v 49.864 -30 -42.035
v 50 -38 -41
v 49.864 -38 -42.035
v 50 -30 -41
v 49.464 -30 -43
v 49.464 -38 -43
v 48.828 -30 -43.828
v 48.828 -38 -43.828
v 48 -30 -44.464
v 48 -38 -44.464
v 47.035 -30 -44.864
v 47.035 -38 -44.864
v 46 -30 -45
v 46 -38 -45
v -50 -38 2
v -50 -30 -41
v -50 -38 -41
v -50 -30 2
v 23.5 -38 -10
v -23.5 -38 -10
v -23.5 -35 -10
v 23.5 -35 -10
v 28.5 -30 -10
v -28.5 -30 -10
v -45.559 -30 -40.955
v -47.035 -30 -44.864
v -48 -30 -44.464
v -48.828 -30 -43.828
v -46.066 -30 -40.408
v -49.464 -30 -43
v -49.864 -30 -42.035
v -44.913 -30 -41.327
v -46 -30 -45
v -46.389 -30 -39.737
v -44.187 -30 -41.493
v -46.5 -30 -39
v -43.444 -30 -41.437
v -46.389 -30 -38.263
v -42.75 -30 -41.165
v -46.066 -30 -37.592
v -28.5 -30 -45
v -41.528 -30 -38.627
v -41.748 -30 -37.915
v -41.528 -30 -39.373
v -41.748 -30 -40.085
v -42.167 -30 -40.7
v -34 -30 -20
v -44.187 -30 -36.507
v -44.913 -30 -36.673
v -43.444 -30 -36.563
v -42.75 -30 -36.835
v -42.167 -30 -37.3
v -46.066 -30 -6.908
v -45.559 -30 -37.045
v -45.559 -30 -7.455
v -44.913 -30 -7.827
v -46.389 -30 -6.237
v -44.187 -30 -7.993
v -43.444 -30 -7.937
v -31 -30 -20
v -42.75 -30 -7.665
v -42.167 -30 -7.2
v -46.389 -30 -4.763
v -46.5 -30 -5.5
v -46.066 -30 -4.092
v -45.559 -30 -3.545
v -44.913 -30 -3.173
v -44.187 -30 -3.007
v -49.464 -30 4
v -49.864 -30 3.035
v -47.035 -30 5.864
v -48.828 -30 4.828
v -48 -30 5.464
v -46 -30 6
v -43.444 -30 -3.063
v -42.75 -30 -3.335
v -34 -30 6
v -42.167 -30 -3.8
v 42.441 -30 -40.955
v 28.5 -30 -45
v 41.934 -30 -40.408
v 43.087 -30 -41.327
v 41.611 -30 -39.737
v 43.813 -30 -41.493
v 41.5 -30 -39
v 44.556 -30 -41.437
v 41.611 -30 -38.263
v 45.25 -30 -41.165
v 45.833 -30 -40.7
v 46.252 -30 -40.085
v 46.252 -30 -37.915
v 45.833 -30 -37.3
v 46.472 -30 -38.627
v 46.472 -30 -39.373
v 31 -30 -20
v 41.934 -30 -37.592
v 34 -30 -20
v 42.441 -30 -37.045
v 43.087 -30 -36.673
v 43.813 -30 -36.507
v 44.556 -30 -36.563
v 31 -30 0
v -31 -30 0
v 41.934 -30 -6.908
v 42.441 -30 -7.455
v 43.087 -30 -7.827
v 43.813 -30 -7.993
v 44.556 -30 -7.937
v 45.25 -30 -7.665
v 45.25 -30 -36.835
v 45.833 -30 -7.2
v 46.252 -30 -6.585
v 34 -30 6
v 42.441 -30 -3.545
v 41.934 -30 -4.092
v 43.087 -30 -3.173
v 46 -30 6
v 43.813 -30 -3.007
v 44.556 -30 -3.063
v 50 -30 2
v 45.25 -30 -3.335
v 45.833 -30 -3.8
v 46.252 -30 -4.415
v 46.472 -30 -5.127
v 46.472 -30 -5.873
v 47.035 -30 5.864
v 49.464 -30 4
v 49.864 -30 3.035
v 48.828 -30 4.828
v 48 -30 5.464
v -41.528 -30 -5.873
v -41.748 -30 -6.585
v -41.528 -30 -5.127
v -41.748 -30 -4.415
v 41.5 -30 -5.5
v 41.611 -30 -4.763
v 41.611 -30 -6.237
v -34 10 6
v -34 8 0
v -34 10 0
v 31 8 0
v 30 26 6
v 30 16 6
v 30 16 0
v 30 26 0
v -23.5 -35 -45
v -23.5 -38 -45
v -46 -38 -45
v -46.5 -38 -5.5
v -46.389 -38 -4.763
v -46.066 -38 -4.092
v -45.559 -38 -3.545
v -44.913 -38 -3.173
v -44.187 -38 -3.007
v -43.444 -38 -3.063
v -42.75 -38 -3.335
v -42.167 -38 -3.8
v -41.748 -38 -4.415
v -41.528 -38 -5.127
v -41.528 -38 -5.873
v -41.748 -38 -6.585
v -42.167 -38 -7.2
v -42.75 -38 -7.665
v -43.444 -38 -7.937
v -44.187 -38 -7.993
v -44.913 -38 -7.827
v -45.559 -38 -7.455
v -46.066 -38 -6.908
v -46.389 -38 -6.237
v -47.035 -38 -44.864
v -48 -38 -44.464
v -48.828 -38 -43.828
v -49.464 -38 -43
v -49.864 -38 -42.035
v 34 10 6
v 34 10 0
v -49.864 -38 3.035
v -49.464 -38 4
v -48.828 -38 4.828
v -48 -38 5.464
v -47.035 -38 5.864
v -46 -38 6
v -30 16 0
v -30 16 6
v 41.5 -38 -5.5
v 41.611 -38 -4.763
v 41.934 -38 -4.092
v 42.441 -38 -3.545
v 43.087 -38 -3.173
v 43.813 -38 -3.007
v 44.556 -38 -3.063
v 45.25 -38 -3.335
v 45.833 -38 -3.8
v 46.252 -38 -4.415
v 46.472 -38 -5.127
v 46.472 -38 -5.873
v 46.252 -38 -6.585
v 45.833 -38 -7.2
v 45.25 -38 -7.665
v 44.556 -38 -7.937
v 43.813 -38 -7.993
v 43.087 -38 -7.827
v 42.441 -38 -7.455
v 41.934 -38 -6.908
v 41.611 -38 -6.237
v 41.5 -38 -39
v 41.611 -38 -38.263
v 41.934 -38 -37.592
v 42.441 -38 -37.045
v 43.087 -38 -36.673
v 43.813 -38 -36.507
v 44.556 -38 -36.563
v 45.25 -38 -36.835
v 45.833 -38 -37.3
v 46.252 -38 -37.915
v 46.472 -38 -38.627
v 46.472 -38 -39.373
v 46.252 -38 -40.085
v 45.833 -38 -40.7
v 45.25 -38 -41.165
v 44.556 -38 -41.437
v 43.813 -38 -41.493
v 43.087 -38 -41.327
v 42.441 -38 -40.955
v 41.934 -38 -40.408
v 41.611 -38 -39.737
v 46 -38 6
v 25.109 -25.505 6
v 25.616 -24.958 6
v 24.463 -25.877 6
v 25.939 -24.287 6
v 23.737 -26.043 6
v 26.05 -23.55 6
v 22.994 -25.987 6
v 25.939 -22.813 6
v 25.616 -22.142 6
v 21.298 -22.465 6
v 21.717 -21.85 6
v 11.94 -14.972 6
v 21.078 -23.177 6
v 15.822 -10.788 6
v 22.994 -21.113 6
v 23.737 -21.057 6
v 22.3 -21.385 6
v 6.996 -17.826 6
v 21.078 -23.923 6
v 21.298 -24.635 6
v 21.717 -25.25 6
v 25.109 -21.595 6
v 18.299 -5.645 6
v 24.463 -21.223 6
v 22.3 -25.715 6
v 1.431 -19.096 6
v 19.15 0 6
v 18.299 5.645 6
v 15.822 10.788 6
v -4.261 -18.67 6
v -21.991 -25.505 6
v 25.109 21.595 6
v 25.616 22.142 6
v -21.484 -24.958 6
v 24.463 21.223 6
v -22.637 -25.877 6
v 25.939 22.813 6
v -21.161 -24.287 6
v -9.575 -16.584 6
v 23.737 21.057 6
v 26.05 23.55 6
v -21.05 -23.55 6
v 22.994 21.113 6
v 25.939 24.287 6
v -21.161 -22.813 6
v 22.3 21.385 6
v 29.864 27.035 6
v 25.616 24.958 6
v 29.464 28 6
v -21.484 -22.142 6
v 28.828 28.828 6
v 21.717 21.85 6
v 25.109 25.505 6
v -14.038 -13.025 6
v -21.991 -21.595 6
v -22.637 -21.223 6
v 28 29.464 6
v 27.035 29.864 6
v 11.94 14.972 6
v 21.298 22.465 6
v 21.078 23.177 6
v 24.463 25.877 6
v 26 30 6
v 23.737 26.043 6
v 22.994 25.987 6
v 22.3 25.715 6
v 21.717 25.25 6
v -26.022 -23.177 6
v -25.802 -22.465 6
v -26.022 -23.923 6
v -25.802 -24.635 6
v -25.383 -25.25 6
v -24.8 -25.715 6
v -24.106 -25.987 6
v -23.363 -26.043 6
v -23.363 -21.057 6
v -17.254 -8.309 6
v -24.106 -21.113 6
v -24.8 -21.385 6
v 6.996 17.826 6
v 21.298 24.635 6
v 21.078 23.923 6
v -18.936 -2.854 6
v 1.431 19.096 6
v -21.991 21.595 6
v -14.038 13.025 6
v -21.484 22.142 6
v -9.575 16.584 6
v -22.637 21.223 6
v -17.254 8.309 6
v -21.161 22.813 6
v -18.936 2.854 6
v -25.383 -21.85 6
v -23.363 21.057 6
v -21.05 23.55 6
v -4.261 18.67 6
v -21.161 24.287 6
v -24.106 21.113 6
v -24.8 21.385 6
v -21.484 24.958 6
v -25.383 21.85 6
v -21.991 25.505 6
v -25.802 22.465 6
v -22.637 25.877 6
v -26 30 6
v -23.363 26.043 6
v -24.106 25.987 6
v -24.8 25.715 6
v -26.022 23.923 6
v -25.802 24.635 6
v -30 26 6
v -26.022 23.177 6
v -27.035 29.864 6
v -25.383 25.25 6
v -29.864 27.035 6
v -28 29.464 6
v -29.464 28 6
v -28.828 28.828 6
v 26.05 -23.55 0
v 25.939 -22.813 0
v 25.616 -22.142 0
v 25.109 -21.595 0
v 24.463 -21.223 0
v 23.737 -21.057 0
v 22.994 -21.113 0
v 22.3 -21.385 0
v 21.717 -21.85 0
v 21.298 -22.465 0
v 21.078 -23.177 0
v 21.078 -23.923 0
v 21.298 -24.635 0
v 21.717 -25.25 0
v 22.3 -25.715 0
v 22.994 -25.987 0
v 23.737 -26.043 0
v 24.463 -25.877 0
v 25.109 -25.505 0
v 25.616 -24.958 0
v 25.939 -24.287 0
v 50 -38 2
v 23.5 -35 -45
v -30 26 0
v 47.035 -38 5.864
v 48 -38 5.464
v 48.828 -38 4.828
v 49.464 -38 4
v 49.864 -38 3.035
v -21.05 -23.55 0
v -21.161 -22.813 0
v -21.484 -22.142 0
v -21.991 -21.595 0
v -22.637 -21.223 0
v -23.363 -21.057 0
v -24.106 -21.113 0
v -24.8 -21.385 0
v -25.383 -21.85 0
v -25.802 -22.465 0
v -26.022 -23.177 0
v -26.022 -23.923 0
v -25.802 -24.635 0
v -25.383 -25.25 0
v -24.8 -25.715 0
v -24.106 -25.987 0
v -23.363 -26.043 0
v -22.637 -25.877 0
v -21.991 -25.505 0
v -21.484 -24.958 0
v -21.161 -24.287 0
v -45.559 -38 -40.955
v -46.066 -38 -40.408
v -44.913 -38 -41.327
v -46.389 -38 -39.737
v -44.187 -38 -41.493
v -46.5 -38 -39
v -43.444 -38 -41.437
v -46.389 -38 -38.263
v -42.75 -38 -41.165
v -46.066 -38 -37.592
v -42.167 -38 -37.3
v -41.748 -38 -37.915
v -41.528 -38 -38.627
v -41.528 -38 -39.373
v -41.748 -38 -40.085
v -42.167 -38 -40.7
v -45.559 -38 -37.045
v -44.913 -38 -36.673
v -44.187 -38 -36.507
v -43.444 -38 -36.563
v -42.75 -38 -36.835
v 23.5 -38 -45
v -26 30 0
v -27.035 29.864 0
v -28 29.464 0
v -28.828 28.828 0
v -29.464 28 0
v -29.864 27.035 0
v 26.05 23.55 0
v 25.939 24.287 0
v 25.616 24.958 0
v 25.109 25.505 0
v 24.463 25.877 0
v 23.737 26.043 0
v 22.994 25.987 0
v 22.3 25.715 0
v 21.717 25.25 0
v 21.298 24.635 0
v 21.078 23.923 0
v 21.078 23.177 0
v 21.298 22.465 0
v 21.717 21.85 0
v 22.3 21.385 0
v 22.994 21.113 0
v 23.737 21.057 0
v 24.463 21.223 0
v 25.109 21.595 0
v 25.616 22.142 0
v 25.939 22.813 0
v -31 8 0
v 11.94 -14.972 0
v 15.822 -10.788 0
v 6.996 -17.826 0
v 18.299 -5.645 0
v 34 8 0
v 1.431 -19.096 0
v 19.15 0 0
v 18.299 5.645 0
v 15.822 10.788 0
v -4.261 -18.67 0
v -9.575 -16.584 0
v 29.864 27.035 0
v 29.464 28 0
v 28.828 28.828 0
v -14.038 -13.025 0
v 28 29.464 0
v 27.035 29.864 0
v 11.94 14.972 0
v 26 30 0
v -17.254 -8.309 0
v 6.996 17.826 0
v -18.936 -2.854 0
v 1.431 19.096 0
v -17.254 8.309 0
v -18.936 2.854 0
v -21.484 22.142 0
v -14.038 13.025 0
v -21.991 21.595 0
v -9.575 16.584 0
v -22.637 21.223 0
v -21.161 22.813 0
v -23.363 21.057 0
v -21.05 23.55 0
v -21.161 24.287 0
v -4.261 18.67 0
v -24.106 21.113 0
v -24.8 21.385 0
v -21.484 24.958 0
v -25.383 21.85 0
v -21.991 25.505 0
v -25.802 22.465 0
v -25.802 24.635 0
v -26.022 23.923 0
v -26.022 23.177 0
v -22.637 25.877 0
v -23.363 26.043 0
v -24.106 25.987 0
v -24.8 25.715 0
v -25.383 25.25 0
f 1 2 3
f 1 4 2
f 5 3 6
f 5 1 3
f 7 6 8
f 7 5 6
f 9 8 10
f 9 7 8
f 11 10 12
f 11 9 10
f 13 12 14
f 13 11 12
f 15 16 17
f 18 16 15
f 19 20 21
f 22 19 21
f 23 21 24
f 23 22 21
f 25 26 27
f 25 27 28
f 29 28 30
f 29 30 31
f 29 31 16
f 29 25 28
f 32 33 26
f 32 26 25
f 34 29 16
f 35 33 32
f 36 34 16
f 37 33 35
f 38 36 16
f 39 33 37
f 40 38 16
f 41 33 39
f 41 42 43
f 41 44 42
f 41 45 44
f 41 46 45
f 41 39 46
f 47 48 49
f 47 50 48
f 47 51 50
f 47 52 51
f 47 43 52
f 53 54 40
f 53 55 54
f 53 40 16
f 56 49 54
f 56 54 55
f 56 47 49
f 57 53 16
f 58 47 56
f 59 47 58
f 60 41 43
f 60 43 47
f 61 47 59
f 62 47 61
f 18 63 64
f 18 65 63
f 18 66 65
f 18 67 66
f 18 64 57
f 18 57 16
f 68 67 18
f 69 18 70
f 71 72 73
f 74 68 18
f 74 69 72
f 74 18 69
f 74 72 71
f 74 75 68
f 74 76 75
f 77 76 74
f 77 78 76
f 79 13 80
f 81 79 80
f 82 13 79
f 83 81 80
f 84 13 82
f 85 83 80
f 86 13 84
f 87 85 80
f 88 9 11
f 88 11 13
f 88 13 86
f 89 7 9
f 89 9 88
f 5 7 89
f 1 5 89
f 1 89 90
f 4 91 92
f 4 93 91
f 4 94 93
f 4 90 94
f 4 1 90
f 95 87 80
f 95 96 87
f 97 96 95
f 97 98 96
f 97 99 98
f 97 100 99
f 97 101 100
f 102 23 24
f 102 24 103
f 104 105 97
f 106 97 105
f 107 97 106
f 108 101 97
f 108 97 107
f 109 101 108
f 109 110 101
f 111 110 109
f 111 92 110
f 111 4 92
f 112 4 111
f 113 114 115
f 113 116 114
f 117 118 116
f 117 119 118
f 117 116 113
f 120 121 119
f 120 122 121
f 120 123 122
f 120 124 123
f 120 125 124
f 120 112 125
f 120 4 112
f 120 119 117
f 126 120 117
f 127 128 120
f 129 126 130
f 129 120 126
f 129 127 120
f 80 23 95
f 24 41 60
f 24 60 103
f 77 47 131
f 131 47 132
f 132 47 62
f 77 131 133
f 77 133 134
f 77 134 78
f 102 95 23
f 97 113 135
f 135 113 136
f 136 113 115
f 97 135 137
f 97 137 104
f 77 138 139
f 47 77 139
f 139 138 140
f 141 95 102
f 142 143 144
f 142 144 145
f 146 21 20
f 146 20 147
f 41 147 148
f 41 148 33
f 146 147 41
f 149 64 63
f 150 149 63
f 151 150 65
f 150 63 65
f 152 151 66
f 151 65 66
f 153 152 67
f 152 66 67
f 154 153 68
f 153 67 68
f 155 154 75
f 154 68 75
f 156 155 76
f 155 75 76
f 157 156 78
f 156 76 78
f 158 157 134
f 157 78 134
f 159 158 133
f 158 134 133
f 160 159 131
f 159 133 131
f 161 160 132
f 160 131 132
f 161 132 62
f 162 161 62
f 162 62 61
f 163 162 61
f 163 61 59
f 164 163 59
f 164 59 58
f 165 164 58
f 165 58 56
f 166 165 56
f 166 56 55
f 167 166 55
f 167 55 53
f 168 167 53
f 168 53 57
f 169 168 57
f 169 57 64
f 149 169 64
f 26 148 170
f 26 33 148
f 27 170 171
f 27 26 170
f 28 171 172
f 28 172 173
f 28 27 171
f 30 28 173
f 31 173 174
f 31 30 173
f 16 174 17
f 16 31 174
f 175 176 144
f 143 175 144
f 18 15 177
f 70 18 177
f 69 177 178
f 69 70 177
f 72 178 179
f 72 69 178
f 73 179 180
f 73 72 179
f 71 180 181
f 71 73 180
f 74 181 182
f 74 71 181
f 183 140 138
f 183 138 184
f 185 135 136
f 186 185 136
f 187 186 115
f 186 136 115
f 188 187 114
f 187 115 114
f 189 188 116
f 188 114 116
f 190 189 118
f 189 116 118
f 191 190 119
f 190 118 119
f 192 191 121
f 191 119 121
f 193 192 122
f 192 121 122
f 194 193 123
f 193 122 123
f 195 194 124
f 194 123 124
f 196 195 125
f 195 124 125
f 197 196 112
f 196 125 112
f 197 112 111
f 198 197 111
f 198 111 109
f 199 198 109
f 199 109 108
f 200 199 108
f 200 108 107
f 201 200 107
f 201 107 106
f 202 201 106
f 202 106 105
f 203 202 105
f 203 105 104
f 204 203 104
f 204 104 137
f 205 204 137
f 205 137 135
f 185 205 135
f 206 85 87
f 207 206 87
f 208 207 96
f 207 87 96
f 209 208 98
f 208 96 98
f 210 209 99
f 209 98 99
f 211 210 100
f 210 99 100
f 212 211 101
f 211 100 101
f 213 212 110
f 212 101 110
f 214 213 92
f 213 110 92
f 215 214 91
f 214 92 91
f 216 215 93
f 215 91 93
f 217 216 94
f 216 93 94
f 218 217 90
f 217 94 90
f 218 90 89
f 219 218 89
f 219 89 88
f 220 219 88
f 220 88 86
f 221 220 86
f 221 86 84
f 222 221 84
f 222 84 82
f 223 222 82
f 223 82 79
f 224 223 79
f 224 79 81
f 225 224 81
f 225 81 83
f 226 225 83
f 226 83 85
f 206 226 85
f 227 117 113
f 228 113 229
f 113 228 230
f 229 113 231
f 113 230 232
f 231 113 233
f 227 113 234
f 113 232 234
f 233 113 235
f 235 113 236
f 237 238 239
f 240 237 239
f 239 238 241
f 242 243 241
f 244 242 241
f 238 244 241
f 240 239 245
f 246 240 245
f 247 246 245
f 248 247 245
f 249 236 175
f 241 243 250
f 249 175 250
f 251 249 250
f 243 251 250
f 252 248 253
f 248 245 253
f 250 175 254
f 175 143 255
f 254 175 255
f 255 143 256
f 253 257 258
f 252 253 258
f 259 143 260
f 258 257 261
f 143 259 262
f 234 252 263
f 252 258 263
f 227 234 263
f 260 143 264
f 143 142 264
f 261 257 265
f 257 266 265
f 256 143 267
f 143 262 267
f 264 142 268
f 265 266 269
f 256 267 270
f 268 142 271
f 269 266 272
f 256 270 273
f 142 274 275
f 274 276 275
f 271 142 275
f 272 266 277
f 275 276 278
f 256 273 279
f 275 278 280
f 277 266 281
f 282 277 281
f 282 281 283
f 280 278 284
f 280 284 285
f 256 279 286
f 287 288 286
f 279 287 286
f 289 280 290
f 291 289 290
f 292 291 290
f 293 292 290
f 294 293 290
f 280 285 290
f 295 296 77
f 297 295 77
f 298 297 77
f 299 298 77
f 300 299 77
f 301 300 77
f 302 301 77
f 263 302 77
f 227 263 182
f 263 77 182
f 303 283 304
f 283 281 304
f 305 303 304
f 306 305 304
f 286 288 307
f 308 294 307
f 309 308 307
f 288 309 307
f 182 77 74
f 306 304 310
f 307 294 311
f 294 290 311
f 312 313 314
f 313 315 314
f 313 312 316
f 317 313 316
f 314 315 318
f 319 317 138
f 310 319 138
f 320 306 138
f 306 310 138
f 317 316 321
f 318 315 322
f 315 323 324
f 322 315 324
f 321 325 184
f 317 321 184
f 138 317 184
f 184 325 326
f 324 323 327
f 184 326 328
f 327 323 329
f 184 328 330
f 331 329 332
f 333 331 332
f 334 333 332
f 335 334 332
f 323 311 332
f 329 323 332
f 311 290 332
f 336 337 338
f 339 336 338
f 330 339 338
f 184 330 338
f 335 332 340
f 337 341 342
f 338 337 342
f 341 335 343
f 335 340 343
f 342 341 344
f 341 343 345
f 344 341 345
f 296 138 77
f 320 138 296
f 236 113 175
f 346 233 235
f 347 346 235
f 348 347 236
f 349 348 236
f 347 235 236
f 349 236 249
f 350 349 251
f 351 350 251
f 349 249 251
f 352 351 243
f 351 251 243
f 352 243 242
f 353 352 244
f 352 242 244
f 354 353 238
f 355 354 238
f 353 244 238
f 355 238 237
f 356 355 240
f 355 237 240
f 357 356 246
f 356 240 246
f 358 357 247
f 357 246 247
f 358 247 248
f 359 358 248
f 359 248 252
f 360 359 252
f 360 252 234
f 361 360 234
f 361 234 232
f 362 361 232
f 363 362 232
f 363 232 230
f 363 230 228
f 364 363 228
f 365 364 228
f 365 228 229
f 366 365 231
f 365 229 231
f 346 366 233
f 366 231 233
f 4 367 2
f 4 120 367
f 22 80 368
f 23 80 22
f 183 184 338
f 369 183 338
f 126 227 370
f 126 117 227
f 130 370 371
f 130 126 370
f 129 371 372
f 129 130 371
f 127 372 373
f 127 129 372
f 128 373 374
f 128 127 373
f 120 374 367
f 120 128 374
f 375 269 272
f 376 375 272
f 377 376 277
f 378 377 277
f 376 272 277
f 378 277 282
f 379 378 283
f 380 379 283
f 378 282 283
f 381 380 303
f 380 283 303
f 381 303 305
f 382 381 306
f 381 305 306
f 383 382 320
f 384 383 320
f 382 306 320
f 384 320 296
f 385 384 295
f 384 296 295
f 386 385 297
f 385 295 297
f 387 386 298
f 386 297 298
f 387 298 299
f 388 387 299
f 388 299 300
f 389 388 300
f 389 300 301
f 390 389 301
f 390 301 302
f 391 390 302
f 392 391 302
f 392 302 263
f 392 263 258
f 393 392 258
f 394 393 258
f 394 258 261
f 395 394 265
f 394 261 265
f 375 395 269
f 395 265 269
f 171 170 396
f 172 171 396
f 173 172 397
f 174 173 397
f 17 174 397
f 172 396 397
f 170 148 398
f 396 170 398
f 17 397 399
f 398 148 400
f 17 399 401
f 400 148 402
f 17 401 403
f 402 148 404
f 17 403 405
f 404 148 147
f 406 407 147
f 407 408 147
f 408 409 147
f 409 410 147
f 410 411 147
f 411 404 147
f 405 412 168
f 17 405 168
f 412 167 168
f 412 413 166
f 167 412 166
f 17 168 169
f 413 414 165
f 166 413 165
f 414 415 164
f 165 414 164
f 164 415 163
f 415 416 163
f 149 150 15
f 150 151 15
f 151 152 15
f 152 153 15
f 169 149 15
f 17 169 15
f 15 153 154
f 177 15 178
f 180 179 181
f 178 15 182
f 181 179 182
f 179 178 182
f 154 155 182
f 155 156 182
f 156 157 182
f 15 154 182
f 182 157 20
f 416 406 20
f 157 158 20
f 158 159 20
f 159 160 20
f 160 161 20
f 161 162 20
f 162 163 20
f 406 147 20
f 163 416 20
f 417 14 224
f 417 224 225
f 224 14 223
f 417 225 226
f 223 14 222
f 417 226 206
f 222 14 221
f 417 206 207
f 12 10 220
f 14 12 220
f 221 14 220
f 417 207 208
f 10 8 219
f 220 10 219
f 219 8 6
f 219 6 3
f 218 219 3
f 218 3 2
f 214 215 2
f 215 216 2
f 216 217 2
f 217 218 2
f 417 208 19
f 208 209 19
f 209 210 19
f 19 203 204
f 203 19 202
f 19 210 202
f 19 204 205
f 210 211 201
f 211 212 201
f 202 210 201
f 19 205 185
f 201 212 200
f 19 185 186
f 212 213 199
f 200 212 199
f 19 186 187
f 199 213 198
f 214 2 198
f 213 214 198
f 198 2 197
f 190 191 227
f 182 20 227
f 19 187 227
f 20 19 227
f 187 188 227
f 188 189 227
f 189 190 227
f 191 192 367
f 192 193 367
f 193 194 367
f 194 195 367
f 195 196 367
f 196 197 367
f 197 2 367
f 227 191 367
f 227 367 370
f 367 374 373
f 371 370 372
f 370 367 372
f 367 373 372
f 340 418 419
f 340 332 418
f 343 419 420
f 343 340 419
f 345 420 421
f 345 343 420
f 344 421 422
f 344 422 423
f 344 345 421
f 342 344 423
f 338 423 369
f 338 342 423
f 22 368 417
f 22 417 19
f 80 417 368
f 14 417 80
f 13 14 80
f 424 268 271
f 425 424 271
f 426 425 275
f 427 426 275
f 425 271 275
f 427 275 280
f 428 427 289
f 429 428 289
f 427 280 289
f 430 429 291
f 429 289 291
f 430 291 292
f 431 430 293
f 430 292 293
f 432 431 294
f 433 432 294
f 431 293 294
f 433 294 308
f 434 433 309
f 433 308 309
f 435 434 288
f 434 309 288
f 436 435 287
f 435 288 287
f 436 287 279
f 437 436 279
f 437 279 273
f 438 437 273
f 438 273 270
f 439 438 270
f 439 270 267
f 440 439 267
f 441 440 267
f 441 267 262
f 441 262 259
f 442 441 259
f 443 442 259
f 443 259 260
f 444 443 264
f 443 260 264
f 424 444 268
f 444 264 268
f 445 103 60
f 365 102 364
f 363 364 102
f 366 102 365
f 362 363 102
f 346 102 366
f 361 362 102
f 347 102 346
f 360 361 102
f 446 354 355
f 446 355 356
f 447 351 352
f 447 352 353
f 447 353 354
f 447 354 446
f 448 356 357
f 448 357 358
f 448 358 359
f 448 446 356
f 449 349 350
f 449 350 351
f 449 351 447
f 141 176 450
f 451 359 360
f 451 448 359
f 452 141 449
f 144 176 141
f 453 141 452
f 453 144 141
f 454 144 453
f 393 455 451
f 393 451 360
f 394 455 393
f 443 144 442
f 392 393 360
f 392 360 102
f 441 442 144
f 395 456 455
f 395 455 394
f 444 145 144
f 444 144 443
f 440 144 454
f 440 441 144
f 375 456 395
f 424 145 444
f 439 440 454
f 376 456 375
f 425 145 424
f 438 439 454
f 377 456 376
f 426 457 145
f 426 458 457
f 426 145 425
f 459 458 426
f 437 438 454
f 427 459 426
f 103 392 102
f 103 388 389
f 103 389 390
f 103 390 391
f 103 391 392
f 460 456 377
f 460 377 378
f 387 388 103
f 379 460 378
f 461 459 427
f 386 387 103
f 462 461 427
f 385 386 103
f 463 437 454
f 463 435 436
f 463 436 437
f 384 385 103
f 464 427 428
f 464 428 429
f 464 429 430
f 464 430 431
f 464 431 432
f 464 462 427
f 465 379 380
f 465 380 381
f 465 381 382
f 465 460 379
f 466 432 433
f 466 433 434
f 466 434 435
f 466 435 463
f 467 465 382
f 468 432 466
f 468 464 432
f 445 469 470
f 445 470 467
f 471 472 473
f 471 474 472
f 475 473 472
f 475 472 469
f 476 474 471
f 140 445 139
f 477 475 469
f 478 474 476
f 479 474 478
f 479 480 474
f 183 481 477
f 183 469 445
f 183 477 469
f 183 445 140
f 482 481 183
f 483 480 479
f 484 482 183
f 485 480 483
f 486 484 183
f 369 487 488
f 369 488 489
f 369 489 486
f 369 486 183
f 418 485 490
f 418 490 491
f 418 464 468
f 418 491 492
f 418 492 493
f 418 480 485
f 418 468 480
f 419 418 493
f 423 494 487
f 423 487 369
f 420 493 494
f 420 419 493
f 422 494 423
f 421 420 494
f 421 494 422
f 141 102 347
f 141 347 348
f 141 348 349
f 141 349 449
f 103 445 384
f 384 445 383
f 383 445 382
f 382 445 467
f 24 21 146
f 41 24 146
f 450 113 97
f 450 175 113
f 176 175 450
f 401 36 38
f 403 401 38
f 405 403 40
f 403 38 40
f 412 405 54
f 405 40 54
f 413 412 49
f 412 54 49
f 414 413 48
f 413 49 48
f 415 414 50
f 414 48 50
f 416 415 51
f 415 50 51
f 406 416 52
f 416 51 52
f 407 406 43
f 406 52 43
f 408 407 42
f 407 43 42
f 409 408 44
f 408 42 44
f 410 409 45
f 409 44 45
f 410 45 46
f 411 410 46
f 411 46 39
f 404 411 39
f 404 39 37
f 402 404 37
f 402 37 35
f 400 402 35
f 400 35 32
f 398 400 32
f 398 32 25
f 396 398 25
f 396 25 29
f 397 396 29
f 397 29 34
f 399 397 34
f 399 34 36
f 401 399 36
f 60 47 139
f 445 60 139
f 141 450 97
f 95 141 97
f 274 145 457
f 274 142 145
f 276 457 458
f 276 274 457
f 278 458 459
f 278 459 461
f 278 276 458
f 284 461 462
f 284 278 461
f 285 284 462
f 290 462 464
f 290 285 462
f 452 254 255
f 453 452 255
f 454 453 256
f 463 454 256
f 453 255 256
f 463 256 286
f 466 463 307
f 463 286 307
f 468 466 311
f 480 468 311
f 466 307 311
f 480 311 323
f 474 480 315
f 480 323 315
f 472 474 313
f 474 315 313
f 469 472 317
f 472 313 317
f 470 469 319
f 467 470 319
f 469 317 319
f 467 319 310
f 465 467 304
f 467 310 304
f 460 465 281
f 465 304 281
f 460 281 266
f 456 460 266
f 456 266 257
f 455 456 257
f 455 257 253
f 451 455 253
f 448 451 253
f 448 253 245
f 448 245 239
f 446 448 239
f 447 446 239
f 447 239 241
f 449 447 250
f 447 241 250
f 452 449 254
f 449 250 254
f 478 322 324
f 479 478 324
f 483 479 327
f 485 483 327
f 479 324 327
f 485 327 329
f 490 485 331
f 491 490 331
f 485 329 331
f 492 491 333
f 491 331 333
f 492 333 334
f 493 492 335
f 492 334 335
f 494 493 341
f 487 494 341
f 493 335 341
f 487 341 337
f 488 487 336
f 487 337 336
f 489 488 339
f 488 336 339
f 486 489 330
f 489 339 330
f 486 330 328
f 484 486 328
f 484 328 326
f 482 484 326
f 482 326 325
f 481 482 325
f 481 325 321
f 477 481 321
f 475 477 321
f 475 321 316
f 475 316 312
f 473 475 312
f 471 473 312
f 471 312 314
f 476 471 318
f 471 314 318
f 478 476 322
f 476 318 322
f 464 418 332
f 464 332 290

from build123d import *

# Parameters (mm, degrees)
SKETCH_1_W          = 60
SKETCH_1_H          = 60
EXTRUDE_1_DEPTH     = 6
SKETCH_2_R          = 19.15
CUT_EXTRUDE_1_DEPTH = 6
SKETCH_3_R          = 2.5
CUT_EXTRUDE_2_DEPTH = 6
SKETCH_4_W          = 60
SKETCH_4_H          = 6
EXTRUDE_2_DEPTH     = 8
SKETCH_5_W          = 60
SKETCH_5_H          = 8
EXTRUDE_3_DEPTH     = 45
SKETCH_6_W          = 51
SKETCH_6_H          = 8
EXTRUDE_4_DEPTH     = 20
SKETCH_7_W          = 51
SKETCH_7_H          = 8
EXTRUDE_5_DEPTH     = 20
EXTRUDE_6_DEPTH     = 6
EXTRUDE_8_DEPTH     = 6
EXTRUDE_10_DEPTH    = 2
EXTRUDE_11_DEPTH    = 2
EXTRUDE_12_DEPTH    = 1
EXTRUDE_13_DEPTH    = 1
SKETCH_14_W         = 35
SKETCH_14_H         = 59.55119734
CUT_EXTRUDE_3_DEPTH = 10
SKETCH_15_R         = 2.5
CUT_EXTRUDE_4_DEPTH = 10
SKETCH_16_W         = 35
SKETCH_16_H         = 8
CUT_EXTRUDE_6_DEPTH = 6
SKETCH_17_W         = 35
SKETCH_17_H         = 8
CUT_EXTRUDE_7_DEPTH = 6
CHAMFER_3_SIZE      = 5
CHAMFER_4_SIZE      = 5
FILLET_2_R          = 4
FILLET_3_R          = 4
FILLET_4_R          = 4
FILLET_5_R          = 4
FILLET_6_R          = 4
FILLET_7_R          = 4


with BuildPart() as part:
    # 草图1 → 凸台-拉伸1 (new body)
    with BuildSketch(Plane.XY):
        Rectangle(SKETCH_1_W, SKETCH_1_H)
    extrude(amount=EXTRUDE_1_DEPTH)

    # 草图2 → 切除-拉伸1 (cut)
    with BuildSketch(Plane.XY.offset(6)):
        Circle(SKETCH_2_R)
    extrude(amount=-CUT_EXTRUDE_1_DEPTH, mode=Mode.SUBTRACT)

    # 草图3 → 切除-拉伸2 (cut)
    with BuildSketch(Plane.XY.offset(6)):
        with Locations((-23.55, 23.55)):
            Circle(SKETCH_3_R)
        with Locations((-23.55, -23.55)):
            Circle(SKETCH_3_R)
        with Locations((23.55, 23.55)):
            Circle(SKETCH_3_R)
        with Locations((23.55, -23.55)):
            Circle(SKETCH_3_R)
    extrude(amount=-CUT_EXTRUDE_2_DEPTH, mode=Mode.SUBTRACT)

    # 草图4 → 凸台-拉伸2 (add)
    with BuildSketch(Plane.XZ.offset(30)):
        with Locations((0, 3)):
            Rectangle(SKETCH_4_W, SKETCH_4_H)
    extrude(amount=EXTRUDE_2_DEPTH)

    # 草图5 → 凸台-拉伸3 (add)
    with BuildSketch(Plane(origin=(0, 0, 0), x_dir=(-1, 0, 0), z_dir=(0, 0, -1))):
        with Locations((0, -34)):
            Rectangle(SKETCH_5_W, SKETCH_5_H)
    extrude(amount=EXTRUDE_3_DEPTH)

    # 草图6 → 凸台-拉伸4 (add)
    with BuildSketch(Plane(origin=(30, 0, 0), x_dir=(0, 0, -1), z_dir=(1, 0, 0))):
        with Locations((19.5, -34)):
            Rectangle(SKETCH_6_W, SKETCH_6_H)
    extrude(amount=EXTRUDE_4_DEPTH)

    # 草图7 → 凸台-拉伸5 (add)
    with BuildSketch(Plane.ZY.offset(30)):
        with Locations((-19.5, -34)):
            Rectangle(SKETCH_7_W, SKETCH_7_H)
    extrude(amount=EXTRUDE_5_DEPTH)

    # 草图8 → 凸台-拉伸6 (add)
    with BuildSketch(Plane(origin=(0, 0, 0), x_dir=(-1, 0, 0), z_dir=(0, 0, -1))):
        Polygon((-30, -30), (-34, -30), (-34, 10), (-30, 16), align=None)
    extrude(amount=-EXTRUDE_6_DEPTH)

    # 草图9 → 凸台-拉伸8 (add)
    with BuildSketch(Plane(origin=(0, 0, 0), x_dir=(-1, 0, 0), z_dir=(0, 0, -1))):
        Polygon((30, -30), (34, -30), (34, 10), (30, 16), align=None)
    extrude(amount=-EXTRUDE_8_DEPTH)

    # 草图10 → 凸台-拉伸10 (add)
    with BuildSketch(Plane(origin=(34, 0, 0), x_dir=(0, 0, -1), z_dir=(1, 0, 0))):
        Polygon((0, -30), (20, -30), (0, 8), align=None)
    extrude(amount=-EXTRUDE_10_DEPTH)

    # 草图11 → 凸台-拉伸11 (add)
    with BuildSketch(Plane.ZY.offset(34)):
        Polygon((0, -30), (-20, -30), (0, 8), (0, 0), align=None)
    extrude(amount=-EXTRUDE_11_DEPTH)

    # 草图12 → 凸台-拉伸12 (add)
    with BuildSketch(Plane.ZY.offset(-32)):
        Polygon((-20, -30), (0, -30), (0, 8), align=None)
    extrude(amount=EXTRUDE_12_DEPTH)

    # 草图13 → 凸台-拉伸13 (add)
    with BuildSketch(Plane(origin=(-32, 0, 0), x_dir=(0, 0, -1), z_dir=(1, 0, 0))):
        Polygon((0, 8), (0, -30), (20, -30), align=None)
    extrude(amount=EXTRUDE_13_DEPTH)

    # 草图14 → 切除-拉伸3 (cut)
    with BuildSketch(Plane(origin=(0, -30, 0), x_dir=(1, 0, 0), z_dir=(0, 1, 0))):
        with Locations((0, 39.77559867)):
            Rectangle(SKETCH_14_W, SKETCH_14_H)
    extrude(amount=-CUT_EXTRUDE_3_DEPTH, mode=Mode.SUBTRACT)

    # 草图15 → 切除-拉伸4 (cut)
    with BuildSketch(Plane(origin=(0, -30, 0), x_dir=(1, 0, 0), z_dir=(0, 1, 0))):
        with Locations(Location((-44, 39, 0), (0, 0, 180))):
            Circle(SKETCH_15_R)
        with Locations(Location((-44, 5.5, 0), (0, 0, 180))):
            Circle(SKETCH_15_R)
        with Locations(Location((44, 5.5, 0), (0, 0, 180))):
            Circle(SKETCH_15_R)
        with Locations(Location((44, 39, 0), (0, 0, 180))):
            Circle(SKETCH_15_R)
    extrude(amount=-CUT_EXTRUDE_4_DEPTH, mode=Mode.SUBTRACT)

    # 草图16 → 切除-拉伸6 (cut)
    with BuildSketch(Plane.ZY.offset(-17.5)):
        with Locations((-27.5, -34)):
            Rectangle(SKETCH_16_W, SKETCH_16_H)
    extrude(amount=-CUT_EXTRUDE_6_DEPTH, mode=Mode.SUBTRACT)

    # 草图17 → 切除-拉伸7 (cut)
    with BuildSketch(Plane(origin=(-17.5, 0, 0), x_dir=(0, 0, -1), z_dir=(1, 0, 0))):
        with Locations((27.5, -34)):
            Rectangle(SKETCH_17_W, SKETCH_17_H)
    extrude(amount=-CUT_EXTRUDE_7_DEPTH, mode=Mode.SUBTRACT)

    # 倒角3
    chamfer_3_edges = [part.edges().sort_by_distance(p)[0] for p in [
        (23.5, -30, -27.5),
    ]]
    chamfer(chamfer_3_edges, length=CHAMFER_3_SIZE)

    # 倒角4
    chamfer_4_edges = [part.edges().sort_by_distance(p)[0] for p in [
        (-23.5, -30, -27.5),
    ]]
    chamfer(chamfer_4_edges, length=CHAMFER_4_SIZE)

    # 圆角2
    fillet_2_edges = [part.edges().sort_by_distance(p)[0] for p in [
        (30, 30, 3),
    ]]
    fillet(fillet_2_edges, radius=FILLET_2_R)

    # 圆角3
    fillet_3_edges = [part.edges().sort_by_distance(p)[0] for p in [
        (-30, 30, 3),
    ]]
    fillet(fillet_3_edges, radius=FILLET_3_R)

    # 圆角4
    fillet_4_edges = [part.edges().sort_by_distance(p)[0] for p in [
        (50, -34, -45),
    ]]
    fillet(fillet_4_edges, radius=FILLET_4_R)

    # 圆角5
    fillet_5_edges = [part.edges().sort_by_distance(p)[0] for p in [
        (-50, -34, -45),
    ]]
    fillet(fillet_5_edges, radius=FILLET_5_R)

    # 圆角6
    fillet_6_edges = [part.edges().sort_by_distance(p)[0] for p in [
        (-50, -34, 6),
    ]]
    fillet(fillet_6_edges, radius=FILLET_6_R)

    # 圆角7
    fillet_7_edges = [part.edges().sort_by_distance(p)[0] for p in [
        (50, -34, 6),
    ]]
    fillet(fillet_7_edges, radius=FILLET_7_R)


solid = part.part
